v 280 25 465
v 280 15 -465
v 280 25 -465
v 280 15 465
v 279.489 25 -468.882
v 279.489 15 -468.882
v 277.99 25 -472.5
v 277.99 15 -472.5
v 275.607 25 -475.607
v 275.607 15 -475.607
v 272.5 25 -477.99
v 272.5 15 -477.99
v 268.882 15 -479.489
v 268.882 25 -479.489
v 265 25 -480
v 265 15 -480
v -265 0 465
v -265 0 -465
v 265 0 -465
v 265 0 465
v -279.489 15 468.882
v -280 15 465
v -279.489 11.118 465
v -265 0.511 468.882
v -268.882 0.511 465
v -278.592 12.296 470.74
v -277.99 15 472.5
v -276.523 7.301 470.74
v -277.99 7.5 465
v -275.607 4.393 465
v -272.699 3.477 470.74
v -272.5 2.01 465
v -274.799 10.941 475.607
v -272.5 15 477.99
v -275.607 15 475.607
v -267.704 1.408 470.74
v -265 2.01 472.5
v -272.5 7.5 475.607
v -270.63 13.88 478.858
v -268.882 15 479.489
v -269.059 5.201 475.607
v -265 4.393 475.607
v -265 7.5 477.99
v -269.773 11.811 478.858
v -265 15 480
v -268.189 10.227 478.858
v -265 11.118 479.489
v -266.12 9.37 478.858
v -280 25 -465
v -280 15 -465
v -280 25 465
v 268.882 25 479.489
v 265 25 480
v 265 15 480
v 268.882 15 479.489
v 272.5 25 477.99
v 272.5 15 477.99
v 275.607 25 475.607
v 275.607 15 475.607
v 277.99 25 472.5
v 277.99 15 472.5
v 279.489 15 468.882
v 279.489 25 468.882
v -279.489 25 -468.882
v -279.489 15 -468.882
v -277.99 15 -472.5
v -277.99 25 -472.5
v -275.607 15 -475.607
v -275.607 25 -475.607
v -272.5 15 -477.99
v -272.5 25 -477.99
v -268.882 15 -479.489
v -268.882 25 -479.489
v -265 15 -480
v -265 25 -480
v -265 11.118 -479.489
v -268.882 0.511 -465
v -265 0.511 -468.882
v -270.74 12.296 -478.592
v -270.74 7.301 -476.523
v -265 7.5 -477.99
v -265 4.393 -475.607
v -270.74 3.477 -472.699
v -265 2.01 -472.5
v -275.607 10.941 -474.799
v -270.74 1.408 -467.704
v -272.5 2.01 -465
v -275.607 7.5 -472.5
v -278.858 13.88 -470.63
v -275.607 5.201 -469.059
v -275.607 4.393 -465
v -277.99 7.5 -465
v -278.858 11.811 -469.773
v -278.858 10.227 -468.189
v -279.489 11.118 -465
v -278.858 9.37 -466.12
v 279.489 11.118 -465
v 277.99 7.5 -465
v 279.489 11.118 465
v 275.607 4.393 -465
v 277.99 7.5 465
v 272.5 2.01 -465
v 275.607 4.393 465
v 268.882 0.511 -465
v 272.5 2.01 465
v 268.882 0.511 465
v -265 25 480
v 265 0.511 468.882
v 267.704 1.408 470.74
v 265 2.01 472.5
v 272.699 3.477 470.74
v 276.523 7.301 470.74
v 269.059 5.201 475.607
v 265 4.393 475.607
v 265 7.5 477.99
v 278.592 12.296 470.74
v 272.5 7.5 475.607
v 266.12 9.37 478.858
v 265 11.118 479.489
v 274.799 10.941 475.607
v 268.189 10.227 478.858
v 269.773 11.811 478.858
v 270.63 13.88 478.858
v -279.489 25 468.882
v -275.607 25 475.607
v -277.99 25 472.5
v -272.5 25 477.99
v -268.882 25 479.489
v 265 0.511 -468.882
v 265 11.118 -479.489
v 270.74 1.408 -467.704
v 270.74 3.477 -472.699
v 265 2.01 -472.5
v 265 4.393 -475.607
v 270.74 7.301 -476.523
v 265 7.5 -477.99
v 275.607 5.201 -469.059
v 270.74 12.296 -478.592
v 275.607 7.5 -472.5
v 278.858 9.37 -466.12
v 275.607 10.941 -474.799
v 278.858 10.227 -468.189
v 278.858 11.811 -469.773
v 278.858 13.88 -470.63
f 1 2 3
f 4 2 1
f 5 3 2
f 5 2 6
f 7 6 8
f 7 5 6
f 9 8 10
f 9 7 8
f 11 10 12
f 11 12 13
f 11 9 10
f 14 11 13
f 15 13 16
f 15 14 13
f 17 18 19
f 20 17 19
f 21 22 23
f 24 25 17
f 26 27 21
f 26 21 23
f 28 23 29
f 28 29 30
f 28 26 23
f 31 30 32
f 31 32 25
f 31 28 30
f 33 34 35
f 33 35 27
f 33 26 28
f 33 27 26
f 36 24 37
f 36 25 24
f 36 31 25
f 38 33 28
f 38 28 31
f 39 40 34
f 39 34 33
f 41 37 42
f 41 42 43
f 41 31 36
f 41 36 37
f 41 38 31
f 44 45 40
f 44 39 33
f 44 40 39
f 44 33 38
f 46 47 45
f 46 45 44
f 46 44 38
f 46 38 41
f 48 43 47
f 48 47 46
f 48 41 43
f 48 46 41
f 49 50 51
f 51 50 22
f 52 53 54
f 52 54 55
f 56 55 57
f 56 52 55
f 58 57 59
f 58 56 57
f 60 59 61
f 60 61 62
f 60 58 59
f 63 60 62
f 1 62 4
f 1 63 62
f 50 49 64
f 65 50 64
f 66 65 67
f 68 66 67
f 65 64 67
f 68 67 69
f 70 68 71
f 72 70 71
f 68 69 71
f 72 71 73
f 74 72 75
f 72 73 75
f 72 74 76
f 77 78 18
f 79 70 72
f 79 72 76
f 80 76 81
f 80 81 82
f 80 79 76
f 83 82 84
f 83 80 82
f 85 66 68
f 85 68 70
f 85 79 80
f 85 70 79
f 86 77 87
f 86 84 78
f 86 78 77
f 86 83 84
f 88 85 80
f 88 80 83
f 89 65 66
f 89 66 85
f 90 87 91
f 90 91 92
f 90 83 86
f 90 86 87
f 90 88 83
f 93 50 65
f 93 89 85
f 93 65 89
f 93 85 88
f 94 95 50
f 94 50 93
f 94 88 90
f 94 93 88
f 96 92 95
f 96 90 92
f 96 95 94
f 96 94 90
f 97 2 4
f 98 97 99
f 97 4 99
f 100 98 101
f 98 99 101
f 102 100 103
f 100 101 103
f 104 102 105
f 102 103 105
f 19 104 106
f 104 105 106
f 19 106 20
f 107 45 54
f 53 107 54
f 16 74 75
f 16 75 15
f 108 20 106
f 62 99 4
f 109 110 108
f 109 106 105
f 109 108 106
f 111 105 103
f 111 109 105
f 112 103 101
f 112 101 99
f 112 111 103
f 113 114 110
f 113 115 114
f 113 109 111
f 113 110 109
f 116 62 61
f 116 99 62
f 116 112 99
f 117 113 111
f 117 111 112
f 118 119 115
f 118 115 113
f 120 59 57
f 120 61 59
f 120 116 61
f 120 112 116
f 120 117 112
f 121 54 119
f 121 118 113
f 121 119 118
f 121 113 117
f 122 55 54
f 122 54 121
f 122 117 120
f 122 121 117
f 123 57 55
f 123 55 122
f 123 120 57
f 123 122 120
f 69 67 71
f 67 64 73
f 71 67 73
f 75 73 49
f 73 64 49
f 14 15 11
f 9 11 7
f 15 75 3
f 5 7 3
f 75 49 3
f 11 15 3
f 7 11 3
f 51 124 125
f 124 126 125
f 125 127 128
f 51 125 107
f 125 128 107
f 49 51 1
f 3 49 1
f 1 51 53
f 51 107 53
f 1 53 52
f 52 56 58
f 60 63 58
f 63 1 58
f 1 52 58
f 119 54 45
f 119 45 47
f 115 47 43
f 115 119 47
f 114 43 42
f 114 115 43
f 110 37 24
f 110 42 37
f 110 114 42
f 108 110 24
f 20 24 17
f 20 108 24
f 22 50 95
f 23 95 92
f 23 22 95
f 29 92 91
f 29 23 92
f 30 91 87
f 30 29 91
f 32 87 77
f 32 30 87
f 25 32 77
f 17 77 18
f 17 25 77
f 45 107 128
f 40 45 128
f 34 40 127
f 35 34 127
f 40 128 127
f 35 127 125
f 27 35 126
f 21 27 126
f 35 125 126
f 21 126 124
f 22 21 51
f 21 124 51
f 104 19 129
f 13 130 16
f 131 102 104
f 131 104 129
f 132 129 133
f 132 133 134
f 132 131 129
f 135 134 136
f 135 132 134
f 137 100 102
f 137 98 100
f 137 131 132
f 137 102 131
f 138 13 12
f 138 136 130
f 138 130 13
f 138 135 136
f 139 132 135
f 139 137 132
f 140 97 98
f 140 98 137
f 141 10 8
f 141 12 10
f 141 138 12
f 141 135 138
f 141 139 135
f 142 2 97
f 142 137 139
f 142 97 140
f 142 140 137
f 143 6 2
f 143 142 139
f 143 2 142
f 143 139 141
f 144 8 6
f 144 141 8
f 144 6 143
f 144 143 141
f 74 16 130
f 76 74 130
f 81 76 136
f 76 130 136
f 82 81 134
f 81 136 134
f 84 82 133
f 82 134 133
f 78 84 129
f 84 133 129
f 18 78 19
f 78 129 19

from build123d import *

# Parameters (mm, degrees)
F0_W         = 560
F0_H         = 960
F2_DEPTH     = 25
F3_R         = 15
F4_T1_DEPTH  = 47.5
F4_S5_W      = 15
F4_S5_H      = 15
F4_T6_DEPTH  = 15
F4_S11_W     = 15
F4_S11_H     = 15
F4_T12_DEPTH = 15
F4_S17_W     = 15
F4_S17_H     = 15
F4_T18_DEPTH = 15
F4_S23_W     = 15
F4_S23_H     = 15
F4_T24_DEPTH = 15


# Not quite as in the source:
# - a fillet or chamfer that OpenCascade refuses, or shapes differently, is made with other operations: its cross-section is extruded or revolved along the edge and cut away or added


with BuildPart() as f2:
    # F0 (on Front) → F2 (new body)
    with BuildSketch(Plane.XZ):
        Rectangle(F0_W, F0_H)
    extrude(amount=-F2_DEPTH)

    # F3
    f3_edges = [f2.edges().sort_by_distance(p)[0] for p in [
        (0, 0, 480),
        (-280, 0, 0),
        (0, 0, -480),
        (280, 0, 0),
    ]]
    fillet(f3_edges, radius=F3_R)

    # F4: fillet of radius 15 on 8 edges, made by hand

    # F4_s2 → F4_t1 (cut)
    with BuildSketch(Plane.XZ.offset(-62.5)):
        with BuildLine():
            ThreePointArc((-280, -465), (-275.6066017178, -475.6066017178), (-265, -480))
            Line((-265, -480), (-280, -480))
            Line((-280, -480), (-280, -465))
        make_face()
        with BuildLine():
            ThreePointArc((280, -465), (275.6066017178, -475.6066017178), (265, -480))
            Line((265, -480), (280, -480))
            Line((280, -480), (280, -465))
        make_face()
        with BuildLine():
            ThreePointArc((-265, 480), (-275.6066017178, 475.6066017178), (-280, 465))
            Line((-280, 465), (-280, 480))
            Line((-280, 480), (-265, 480))
        make_face()
        with BuildLine():
            ThreePointArc((265, 480), (275.6066017178, 475.6066017178), (280, 465))
            Line((280, 465), (280, 480))
            Line((280, 480), (265, 480))
        make_face()
    extrude(amount=F4_T1_DEPTH, mode=Mode.SUBTRACT)


with BuildPart() as f4_tool4:
    # F4_s5 → F4_t6 (new body)
    with BuildSketch(Plane.XY.offset(465)):
        with Locations((272.5, 7.5)):
            Rectangle(F4_S5_W, F4_S5_H)
    extrude(amount=F4_T6_DEPTH)

    # F4_s7 → F4_t8 (revolve, cut)
    with BuildSketch(Plane(origin=(265, 15, 465), x_dir=(-0.7071067812, 0.7071067812, 0), z_dir=(0.7071067812, 0.7071067812, 0))):
        with BuildLine():
            ThreePointArc((0, -15), (15, 0), (0, 15))
            Line((0, 15), (0, -15))
        make_face()
    revolve(axis=Axis((265, 15, 465), (0, 0, 1)), mode=Mode.SUBTRACT)


with BuildPart() as f2_1:
    add(f2.part)

    # F4_t3: cut F4_tool4
    add(f4_tool4.part, mode=Mode.SUBTRACT)


with BuildPart() as f4_tool10:
    # F4_s11 → F4_t12 (new body)
    with BuildSketch(Plane.XY.offset(465)):
        with Locations((-272.5, 7.5)):
            Rectangle(F4_S11_W, F4_S11_H)
    extrude(amount=F4_T12_DEPTH)

    # F4_s13 → F4_t14 (revolve, cut)
    with BuildSketch(Plane(origin=(-265, 15, 465), x_dir=(0.7071067812, 0.7071067812, 0), z_dir=(0.7071067812, -0.7071067812, 0))):
        with BuildLine():
            ThreePointArc((0, -15), (15, 0), (0, 15))
            Line((0, 15), (0, -15))
        make_face()
    revolve(axis=Axis((-265, 15, 465), (0, 0, 1)), mode=Mode.SUBTRACT)


with BuildPart() as f2_2:
    add(f2_1.part)

    # F4_t9: cut F4_tool10
    add(f4_tool10.part, mode=Mode.SUBTRACT)


with BuildPart() as f4_tool16:
    # F4_s17 → F4_t18 (new body)
    with BuildSketch(Plane.YZ.offset(265)):
        with Locations((7.5, -472.5)):
            Rectangle(F4_S17_W, F4_S17_H)
    extrude(amount=F4_T18_DEPTH)

    # F4_s19 → F4_t20 (revolve, cut)
    with BuildSketch(Plane(origin=(265, 15, -465), x_dir=(0, 0.7071067812, 0.7071067812), z_dir=(0, 0.7071067812, -0.7071067812))):
        with BuildLine():
            ThreePointArc((0, -15), (15, 0), (0, 15))
            Line((0, 15), (0, -15))
        make_face()
    revolve(axis=Axis((265, 15, -465), (1, 0, 0)), mode=Mode.SUBTRACT)


with BuildPart() as f2_3:
    add(f2_2.part)

    # F4_t15: cut F4_tool16
    add(f4_tool16.part, mode=Mode.SUBTRACT)


with BuildPart() as f4_tool22:
    # F4_s23 → F4_t24 (new body)
    with BuildSketch(Plane.YZ.offset(-265)):
        with Locations((7.5, -472.5)):
            Rectangle(F4_S23_W, F4_S23_H)
    extrude(amount=-F4_T24_DEPTH)

    # F4_s25 → F4_t26 (revolve, cut)
    with BuildSketch(Plane(origin=(-265, 15, -465), x_dir=(0, 0.7071067812, 0.7071067812), z_dir=(0, -0.7071067812, 0.7071067812))):
        with BuildLine():
            ThreePointArc((0, -15), (15, 0), (0, 15))
            Line((0, 15), (0, -15))
        make_face()
    revolve(axis=Axis((-265, 15, -465), (-1, 0, 0)), mode=Mode.SUBTRACT)


with BuildPart() as f2_4:
    add(f2_3.part)

    # F4_t21: cut F4_tool22
    add(f4_tool22.part, mode=Mode.SUBTRACT)


solid = f2_4.part
